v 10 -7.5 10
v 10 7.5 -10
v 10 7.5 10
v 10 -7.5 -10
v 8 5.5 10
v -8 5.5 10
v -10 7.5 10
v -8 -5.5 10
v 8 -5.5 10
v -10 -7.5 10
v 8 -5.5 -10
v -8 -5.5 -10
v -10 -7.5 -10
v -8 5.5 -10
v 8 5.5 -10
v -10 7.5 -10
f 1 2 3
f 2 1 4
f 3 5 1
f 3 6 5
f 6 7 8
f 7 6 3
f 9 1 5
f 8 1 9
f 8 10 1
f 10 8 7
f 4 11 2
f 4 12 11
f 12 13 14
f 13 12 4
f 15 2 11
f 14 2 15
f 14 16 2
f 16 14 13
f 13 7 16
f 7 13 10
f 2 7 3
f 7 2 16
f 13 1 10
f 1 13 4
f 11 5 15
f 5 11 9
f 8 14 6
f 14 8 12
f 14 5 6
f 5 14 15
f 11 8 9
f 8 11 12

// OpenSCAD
difference(){
cube([20,15,20],center=true);
translate([0,0,-0.5])cube([16,11,22],center=true);
}
